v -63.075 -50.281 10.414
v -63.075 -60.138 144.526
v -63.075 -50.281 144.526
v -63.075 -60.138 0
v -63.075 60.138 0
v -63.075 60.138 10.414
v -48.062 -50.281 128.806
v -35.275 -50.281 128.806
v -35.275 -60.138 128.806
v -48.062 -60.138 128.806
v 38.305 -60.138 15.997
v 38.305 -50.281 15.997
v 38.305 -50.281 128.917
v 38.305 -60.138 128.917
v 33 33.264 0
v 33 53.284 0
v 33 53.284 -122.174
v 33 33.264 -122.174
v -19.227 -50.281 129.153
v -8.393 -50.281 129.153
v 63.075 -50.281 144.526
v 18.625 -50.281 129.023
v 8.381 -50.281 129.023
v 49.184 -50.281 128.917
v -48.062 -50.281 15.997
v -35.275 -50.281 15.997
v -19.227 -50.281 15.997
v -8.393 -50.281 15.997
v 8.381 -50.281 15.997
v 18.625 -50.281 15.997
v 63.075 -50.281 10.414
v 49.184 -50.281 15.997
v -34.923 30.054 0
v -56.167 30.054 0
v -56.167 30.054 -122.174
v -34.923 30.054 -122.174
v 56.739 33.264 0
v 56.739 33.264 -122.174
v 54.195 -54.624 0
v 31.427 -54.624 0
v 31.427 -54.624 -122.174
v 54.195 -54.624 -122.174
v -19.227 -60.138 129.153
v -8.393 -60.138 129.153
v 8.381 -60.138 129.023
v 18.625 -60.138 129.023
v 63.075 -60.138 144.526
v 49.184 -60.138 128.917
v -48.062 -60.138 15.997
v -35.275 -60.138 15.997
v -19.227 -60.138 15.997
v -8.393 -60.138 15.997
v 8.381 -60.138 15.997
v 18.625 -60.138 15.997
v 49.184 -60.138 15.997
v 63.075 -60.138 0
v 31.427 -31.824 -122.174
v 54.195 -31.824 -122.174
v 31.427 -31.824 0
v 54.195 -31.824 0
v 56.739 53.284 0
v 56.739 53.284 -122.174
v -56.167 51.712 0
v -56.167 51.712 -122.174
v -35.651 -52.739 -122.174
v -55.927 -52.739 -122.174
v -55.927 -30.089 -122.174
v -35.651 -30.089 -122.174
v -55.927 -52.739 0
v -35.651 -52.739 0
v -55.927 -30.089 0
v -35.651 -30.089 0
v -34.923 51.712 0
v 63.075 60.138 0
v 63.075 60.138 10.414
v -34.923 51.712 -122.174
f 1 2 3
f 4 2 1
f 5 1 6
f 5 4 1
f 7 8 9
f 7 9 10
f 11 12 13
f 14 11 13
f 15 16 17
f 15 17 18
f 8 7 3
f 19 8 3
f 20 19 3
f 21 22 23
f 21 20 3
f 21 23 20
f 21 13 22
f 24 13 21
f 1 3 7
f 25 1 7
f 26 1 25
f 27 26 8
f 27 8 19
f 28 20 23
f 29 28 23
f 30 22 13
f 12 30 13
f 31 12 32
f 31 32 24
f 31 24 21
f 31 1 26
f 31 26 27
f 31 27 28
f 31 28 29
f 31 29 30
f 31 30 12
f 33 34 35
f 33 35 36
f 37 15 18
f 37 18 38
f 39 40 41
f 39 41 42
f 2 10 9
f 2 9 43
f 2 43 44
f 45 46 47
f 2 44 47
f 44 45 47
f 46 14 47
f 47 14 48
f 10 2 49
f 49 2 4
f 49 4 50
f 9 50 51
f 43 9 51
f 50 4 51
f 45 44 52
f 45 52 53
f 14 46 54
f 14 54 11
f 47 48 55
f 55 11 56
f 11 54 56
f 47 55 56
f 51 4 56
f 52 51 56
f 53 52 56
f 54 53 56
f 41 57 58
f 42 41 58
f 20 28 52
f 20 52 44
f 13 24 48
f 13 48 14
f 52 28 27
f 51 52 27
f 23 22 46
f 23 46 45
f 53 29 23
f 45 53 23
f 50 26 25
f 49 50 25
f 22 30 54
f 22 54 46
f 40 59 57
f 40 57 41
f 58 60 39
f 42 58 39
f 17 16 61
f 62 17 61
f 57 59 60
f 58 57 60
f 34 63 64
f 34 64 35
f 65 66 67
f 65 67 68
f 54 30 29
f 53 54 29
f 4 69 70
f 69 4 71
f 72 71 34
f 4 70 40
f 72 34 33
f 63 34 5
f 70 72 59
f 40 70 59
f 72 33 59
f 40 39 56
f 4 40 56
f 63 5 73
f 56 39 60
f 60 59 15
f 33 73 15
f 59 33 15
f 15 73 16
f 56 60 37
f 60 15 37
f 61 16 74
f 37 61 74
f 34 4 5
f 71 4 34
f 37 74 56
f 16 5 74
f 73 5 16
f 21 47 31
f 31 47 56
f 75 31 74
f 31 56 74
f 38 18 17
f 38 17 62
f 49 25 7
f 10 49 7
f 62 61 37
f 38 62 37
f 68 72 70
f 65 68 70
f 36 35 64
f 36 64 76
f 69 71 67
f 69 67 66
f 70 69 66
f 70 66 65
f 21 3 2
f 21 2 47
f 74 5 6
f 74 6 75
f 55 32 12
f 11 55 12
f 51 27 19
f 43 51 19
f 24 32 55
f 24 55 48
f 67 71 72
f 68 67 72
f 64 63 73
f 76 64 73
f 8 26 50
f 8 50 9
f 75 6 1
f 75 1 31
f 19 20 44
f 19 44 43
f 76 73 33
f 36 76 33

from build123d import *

# Parameters (mm, degrees)
F0_W      = 126.1496841908
F0_H      = 120.2754974365
F1_DEPTH  = 10.414
F2_W      = 20.2760398388
F2_H      = 22.6492062211
F3_DEPTH  = 122.174
F4_W      = 22.7675586939
F4_H      = 22.8002071381
F5_DEPTH  = 122.174
F6_W      = 23.7396918237
F6_H      = 20.0196914375
F7_DEPTH  = 122.174
F8_W      = 21.2444029748
F8_H      = 21.6576848179
F9_DEPTH  = 122.174
F10_W     = 126.1496841908
F10_H     = 9.857006371
F11_DEPTH = 134.112
F12_W     = 10.8794793487
F12_H     = 112.9197366536
F12_W_2   = 10.2443918586
F12_H_2   = 113.0264736712
F12_W_3   = 10.8346808702
F12_H_3   = 113.1561808288
F12_W_4   = 12.787386775
F12_H_4   = 112.809246406
F13_DEPTH = 25.4


with BuildPart() as f1:
    # F0 (on Top) → F1 (new body)
    with BuildSketch(Plane.XY):
        Rectangle(F0_W, F0_H)
    extrude(amount=F1_DEPTH)

    # F2 (on face) → F3 (join)
    with BuildSketch(Plane(origin=(0, 0, 0), x_dir=(1, 0, 0), z_dir=(0, 0, -1))):
        with Locations((-45.7890219986, 41.4139181376)):
            Rectangle(F2_W, F2_H)
    extrude(amount=F3_DEPTH)

    # F4 (on face) → F5 (join)
    with BuildSketch(Plane(origin=(0, 0, 0), x_dir=(1, 0, 0), z_dir=(0, 0, -1))):
        with Locations((42.81097278, 43.2243607938)):
            Rectangle(F4_W, F4_H)
    extrude(amount=F5_DEPTH)

    # F6 (on face) → F7 (join)
    with BuildSketch(Plane(origin=(0, 0, 0), x_dir=(1, 0, 0), z_dir=(0, 0, -1))):
        with Locations((44.8694061488, -43.2738680393)):
            Rectangle(F6_W, F6_H)
    extrude(amount=F7_DEPTH)

    # F8 (on face) → F9 (join)
    with BuildSketch(Plane(origin=(0, 0, 0), x_dir=(1, 0, 0), z_dir=(0, 0, -1))):
        with Locations((-45.5452147871, -40.8827578649)):
            Rectangle(F8_W, F8_H)
    extrude(amount=F9_DEPTH)

    # F10 (on face) → F11 (join)
    with BuildSketch(Plane.XY.offset(10.414)):
        with Locations((0, -55.2092455328)):
            Rectangle(F10_W, F10_H)
    extrude(amount=F11_DEPTH)

    # F12 (on face) → F13 (cut)
    with BuildSketch(Plane(origin=(0, -50.2807423472, 0), x_dir=(-1, 0, 0), z_dir=(0, 1, 0))):
        with Locations((-43.7446571887, 72.4568422884)):
            Rectangle(F12_W, F12_H)
        with Locations((-13.5027915239, 72.5102107972)):
            Rectangle(F12_W_2, F12_H_2)
        with Locations((13.8100152835, 72.575064376)):
            Rectangle(F12_W_3, F12_H_3)
        with Locations((41.6683144867, 72.4015971646)):
            Rectangle(F12_W_4, F12_H_4)
    extrude(amount=-F13_DEPTH, mode=Mode.SUBTRACT)


solid = f1.part
